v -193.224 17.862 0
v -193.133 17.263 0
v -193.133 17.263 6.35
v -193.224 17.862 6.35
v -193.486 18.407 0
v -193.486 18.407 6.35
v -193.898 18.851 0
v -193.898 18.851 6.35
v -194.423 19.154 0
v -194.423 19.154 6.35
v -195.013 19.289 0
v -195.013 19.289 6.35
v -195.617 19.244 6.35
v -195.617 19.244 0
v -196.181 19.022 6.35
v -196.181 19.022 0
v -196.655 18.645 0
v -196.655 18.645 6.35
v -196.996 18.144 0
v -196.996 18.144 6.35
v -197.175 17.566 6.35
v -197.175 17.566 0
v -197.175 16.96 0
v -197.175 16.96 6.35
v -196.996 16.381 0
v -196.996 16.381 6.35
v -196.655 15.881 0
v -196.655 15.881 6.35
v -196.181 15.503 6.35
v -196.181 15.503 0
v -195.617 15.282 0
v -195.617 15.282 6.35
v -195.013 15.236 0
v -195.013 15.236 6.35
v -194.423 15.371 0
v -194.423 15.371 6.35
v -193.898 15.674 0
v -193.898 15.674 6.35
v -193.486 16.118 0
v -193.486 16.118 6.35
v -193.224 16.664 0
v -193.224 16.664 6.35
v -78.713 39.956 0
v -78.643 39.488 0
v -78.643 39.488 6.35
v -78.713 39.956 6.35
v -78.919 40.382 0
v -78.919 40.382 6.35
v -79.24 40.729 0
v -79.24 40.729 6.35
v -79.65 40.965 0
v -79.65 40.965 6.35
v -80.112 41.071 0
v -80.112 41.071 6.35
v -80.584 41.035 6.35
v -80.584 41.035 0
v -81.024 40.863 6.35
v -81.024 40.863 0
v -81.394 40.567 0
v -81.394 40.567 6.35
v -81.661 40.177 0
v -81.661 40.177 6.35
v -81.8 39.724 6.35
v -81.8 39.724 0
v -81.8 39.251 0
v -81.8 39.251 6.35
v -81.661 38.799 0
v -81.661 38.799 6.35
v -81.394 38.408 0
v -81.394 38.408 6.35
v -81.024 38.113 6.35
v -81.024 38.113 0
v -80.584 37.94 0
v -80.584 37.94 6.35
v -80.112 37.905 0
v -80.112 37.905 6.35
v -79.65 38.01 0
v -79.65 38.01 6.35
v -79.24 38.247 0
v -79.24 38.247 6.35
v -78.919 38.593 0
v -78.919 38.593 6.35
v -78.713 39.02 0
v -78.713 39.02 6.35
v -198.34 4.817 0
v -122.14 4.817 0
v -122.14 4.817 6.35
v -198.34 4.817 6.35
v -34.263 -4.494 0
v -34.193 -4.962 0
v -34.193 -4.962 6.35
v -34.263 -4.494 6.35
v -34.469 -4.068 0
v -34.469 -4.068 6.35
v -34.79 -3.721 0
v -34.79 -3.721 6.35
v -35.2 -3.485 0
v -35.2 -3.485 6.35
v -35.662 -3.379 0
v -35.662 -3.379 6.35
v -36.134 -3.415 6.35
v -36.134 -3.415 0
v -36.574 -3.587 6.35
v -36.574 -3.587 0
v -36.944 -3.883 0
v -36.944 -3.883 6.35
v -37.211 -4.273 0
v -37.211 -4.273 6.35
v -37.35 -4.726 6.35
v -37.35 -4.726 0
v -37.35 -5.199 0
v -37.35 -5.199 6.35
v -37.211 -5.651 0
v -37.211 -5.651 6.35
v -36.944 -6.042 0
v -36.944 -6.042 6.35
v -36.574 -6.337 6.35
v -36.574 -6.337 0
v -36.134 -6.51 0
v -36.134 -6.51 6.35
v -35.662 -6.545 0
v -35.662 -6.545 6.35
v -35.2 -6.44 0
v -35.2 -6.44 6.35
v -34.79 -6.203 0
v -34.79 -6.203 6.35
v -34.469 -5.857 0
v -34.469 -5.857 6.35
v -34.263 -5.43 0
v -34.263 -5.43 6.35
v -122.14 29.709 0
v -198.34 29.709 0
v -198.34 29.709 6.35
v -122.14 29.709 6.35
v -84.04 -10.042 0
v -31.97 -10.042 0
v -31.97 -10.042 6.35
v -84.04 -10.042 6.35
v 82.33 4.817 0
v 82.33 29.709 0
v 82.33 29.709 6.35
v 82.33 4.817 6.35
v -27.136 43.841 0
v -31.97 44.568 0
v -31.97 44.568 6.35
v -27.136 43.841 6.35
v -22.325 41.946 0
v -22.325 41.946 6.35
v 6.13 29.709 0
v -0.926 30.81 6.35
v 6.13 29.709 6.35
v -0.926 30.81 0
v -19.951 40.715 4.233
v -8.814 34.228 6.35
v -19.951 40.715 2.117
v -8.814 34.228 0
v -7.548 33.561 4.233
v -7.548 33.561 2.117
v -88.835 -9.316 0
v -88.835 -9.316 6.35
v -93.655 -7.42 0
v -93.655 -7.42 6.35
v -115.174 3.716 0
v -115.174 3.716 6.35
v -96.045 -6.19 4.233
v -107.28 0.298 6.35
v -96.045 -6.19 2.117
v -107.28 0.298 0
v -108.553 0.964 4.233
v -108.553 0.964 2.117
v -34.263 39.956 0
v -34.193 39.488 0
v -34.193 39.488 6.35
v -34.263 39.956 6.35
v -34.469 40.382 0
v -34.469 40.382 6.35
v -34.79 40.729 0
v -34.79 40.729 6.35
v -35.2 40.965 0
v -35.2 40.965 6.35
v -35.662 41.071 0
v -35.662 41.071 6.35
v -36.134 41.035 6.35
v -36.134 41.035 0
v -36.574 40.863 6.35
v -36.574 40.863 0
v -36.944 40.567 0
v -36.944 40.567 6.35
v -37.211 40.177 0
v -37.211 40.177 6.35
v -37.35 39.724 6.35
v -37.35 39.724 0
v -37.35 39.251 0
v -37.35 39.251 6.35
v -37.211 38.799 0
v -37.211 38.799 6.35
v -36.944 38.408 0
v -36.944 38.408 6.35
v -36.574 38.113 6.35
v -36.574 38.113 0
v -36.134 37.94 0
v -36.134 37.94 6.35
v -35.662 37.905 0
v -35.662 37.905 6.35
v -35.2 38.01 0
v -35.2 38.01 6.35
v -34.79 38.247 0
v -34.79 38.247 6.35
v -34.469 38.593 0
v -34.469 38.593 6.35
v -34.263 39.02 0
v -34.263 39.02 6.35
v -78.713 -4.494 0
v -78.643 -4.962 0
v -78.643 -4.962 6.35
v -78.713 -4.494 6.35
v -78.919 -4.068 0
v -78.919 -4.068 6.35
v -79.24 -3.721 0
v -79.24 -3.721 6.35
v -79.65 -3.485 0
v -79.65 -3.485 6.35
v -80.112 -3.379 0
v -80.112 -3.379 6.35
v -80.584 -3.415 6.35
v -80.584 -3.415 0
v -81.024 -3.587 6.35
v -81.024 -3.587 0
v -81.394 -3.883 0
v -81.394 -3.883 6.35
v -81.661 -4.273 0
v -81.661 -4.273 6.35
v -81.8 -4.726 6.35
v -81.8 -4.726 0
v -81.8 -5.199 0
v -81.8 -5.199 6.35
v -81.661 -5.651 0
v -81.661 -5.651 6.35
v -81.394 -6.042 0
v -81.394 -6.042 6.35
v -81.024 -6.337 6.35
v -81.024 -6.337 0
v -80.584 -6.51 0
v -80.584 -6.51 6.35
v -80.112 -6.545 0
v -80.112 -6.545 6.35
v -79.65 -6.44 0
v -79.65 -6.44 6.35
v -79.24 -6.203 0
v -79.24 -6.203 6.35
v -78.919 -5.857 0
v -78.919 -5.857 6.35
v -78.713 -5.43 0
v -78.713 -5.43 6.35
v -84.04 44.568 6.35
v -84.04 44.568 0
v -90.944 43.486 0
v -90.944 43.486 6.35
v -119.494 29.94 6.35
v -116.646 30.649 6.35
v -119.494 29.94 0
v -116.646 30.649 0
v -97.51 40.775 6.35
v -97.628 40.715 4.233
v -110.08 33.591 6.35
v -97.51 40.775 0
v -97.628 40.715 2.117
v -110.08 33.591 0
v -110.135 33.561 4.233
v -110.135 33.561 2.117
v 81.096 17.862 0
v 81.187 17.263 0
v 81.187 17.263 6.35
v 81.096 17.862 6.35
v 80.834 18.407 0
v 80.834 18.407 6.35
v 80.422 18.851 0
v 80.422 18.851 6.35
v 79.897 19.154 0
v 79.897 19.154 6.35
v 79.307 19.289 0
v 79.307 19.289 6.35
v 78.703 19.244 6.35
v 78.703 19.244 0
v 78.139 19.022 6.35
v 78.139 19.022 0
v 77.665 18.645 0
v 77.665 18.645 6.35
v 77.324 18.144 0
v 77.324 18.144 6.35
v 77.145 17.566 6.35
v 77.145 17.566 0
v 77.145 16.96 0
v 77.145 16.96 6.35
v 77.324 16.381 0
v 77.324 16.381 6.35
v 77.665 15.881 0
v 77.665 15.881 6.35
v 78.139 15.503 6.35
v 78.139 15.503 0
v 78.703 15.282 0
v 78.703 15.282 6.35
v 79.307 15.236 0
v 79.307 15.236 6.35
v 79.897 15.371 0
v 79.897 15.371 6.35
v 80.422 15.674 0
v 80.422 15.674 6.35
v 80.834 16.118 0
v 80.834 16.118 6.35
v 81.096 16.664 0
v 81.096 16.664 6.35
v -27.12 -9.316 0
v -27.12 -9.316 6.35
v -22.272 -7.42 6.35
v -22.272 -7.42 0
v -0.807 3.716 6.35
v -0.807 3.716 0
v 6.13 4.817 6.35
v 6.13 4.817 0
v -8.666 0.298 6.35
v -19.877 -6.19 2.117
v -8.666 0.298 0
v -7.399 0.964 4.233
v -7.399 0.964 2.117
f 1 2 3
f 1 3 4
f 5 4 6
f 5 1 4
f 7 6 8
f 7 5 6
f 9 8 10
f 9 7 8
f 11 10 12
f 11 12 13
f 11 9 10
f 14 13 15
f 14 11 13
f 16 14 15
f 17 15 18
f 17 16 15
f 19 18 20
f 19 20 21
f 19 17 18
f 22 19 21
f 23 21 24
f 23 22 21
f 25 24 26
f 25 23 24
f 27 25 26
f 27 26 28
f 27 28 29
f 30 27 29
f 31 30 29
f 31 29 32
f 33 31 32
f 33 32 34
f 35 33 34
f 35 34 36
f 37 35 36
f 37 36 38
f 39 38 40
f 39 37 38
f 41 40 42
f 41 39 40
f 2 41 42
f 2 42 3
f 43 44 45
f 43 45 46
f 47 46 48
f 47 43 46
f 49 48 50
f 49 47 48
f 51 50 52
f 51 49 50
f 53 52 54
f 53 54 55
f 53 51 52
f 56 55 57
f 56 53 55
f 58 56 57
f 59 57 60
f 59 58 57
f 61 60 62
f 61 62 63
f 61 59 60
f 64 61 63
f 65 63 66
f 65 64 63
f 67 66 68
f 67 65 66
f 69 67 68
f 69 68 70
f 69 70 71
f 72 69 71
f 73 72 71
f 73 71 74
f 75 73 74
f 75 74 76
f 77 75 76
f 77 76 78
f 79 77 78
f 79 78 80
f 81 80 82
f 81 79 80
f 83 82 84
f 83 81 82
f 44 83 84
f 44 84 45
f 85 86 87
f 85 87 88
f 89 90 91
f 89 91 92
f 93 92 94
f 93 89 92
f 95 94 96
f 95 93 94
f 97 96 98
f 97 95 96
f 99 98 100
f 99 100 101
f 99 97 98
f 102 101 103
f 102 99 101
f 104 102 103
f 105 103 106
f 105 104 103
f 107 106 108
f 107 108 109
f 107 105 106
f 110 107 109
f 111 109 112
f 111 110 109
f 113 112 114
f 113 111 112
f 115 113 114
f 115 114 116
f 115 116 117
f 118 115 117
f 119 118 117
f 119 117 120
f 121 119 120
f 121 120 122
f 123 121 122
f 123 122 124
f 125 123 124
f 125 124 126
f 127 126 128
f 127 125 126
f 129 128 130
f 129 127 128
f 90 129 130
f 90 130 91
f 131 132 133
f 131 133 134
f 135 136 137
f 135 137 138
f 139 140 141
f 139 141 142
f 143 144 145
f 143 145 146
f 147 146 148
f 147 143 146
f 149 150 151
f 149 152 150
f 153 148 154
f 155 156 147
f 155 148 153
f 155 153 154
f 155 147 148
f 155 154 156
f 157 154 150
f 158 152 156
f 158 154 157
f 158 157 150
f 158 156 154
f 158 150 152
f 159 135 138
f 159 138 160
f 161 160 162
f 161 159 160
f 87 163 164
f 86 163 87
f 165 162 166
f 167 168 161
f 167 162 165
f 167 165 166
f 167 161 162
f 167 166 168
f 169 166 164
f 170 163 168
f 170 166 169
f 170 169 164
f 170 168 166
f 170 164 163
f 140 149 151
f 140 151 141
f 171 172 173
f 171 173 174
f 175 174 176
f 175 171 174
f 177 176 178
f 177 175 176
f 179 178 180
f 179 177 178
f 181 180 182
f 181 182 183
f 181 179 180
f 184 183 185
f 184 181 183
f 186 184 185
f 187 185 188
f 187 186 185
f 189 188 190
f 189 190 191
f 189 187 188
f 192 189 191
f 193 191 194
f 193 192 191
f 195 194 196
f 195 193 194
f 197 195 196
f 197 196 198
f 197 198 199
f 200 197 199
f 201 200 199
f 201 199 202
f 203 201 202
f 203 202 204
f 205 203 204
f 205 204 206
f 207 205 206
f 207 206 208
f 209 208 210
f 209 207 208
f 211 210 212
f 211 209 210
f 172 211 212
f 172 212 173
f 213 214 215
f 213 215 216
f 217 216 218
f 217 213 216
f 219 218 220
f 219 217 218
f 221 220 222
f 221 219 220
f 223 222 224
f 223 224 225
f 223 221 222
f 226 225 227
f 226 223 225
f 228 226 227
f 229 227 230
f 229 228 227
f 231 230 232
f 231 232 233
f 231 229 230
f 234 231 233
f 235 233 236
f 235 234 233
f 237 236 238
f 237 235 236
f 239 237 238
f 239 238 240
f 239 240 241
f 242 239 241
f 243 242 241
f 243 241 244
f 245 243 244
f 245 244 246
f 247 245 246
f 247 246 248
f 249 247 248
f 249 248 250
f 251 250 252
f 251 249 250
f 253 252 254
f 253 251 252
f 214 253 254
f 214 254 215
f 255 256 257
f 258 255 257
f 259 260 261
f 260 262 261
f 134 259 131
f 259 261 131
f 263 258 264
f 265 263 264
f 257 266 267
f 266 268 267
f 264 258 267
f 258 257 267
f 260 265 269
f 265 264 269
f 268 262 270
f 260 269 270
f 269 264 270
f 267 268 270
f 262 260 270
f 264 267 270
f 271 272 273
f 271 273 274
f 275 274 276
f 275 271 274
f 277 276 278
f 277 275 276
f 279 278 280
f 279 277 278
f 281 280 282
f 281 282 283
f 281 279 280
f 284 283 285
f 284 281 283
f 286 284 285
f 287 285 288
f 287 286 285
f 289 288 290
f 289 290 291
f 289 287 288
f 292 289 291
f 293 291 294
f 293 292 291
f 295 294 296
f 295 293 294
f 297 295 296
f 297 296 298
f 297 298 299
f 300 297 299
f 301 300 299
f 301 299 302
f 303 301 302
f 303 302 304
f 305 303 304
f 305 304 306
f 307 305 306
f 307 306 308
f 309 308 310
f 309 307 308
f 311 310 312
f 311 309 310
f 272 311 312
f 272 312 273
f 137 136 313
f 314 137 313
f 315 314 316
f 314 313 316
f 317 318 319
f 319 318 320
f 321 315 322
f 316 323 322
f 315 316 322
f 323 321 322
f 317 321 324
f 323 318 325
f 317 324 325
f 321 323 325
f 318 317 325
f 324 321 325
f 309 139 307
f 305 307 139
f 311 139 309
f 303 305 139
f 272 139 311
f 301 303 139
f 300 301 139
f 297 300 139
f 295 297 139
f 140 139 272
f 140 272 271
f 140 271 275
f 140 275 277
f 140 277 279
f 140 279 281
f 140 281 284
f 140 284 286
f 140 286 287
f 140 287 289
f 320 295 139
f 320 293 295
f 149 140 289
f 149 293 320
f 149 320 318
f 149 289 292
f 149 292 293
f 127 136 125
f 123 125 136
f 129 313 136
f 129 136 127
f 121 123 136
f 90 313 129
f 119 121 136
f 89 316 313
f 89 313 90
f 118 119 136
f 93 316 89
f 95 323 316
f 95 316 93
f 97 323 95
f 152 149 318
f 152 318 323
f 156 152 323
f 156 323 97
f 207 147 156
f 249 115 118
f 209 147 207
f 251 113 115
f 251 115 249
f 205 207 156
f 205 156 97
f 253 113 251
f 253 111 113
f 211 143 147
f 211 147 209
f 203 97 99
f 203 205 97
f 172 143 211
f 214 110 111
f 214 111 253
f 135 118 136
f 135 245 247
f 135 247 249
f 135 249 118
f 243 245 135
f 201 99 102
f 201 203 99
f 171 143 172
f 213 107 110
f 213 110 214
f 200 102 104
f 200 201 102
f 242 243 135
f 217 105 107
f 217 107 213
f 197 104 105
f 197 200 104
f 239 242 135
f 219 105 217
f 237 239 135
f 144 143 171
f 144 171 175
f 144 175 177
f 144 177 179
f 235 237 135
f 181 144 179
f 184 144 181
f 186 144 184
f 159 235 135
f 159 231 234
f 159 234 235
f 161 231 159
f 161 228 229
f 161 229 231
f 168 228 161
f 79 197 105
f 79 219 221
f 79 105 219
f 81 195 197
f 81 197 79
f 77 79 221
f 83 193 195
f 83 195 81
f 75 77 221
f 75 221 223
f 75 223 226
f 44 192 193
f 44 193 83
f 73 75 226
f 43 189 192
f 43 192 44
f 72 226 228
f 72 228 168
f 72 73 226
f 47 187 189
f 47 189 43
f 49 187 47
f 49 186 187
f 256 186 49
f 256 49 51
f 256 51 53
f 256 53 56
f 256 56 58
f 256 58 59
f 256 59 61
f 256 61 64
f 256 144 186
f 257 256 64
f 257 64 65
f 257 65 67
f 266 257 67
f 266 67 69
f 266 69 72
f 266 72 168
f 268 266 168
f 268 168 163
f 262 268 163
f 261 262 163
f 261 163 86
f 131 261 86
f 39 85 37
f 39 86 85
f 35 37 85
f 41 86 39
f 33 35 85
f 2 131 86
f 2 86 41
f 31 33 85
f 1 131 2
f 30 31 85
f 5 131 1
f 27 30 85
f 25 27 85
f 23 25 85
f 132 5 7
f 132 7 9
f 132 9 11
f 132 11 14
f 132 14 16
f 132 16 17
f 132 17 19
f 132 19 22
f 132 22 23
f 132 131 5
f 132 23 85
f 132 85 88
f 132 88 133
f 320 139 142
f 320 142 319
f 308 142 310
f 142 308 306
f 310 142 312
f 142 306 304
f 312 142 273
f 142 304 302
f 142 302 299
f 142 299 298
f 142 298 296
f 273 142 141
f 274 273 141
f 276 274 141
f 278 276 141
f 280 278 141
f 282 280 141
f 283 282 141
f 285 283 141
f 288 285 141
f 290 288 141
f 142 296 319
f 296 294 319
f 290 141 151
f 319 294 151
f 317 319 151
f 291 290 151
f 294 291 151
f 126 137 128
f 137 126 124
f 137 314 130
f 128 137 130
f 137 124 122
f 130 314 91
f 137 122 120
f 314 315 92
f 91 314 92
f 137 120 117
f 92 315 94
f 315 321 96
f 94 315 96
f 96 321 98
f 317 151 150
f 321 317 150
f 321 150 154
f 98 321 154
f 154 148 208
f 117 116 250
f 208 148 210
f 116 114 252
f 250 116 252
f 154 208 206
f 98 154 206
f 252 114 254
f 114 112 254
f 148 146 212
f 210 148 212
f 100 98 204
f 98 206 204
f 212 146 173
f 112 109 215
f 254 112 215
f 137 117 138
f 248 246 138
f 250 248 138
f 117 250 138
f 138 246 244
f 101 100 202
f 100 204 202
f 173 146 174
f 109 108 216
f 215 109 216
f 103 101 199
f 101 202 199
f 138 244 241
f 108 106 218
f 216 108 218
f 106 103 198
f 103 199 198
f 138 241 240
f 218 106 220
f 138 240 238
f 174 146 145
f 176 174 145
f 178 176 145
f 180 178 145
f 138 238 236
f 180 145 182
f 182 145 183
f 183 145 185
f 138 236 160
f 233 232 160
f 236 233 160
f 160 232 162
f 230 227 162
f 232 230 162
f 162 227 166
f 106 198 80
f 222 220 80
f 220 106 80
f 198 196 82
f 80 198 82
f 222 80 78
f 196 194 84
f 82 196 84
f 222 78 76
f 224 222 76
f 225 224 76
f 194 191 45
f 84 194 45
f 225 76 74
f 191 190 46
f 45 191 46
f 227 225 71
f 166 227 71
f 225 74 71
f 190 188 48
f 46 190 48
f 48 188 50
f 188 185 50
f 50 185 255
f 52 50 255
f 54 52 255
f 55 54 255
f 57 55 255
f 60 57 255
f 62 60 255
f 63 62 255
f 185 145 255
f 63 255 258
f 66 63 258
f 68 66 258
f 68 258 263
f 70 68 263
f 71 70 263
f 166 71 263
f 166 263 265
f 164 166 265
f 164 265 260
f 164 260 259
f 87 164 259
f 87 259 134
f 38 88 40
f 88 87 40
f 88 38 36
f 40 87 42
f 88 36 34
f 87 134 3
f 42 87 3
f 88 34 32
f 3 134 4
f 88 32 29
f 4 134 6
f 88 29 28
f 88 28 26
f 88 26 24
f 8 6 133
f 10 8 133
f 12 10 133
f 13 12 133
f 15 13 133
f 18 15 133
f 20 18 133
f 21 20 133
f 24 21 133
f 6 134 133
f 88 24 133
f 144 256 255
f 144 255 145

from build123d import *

# Parameters (mm, degrees)
SKETCH1_R      = 1.5875
SKETCH1_R_2    = 2.032
EXTRUDE1_DEPTH = 6.35


with BuildPart() as part:
    # Sketch1 → Extrude1 (new body)
    with BuildSketch(Plane.XY):
        with BuildLine():
            Line((-198.340264606, 29.708721685), (-122.140264606, 29.708721685))
            add(Edge.make_bspline(
                [(-84.040264606, 44.567721685), (-98.359806002, 44.567721685), (-110.19434592, 29.708721685), (-122.140264606, 29.708721685)],
                knots=[0, 0, 0, 0, 1, 1, 1, 1], degree=3))
            Line((-84.040264606, 44.567721685), (-31.970264606, 44.567721685))
            add(Edge.make_bspline(
                [(-31.970264606, 44.567721685), (-19.845994983, 44.567721685), (-8.482470496, 29.708721685), (6.129735394, 29.708721685)],
                knots=[0, 0, 0, 0, 1, 1, 1, 1], degree=3))
            Line((6.129735394, 29.708721685), (82.329735394, 29.708721685))
            Line((82.329735394, 29.708721685), (82.329735394, 4.816721685))
            Line((82.329735394, 4.816721685), (6.129735394, 4.816721685))
            add(Edge.make_bspline(
                [(-31.970264606, -10.042278315), (-19.845994974, -10.042278315), (-8.148130117, 4.816721685), (6.129735394, 4.816721685)],
                knots=[0, 0, 0, 0, 1, 1, 1, 1], degree=3))
            Line((-31.970264606, -10.042278315), (-84.040264606, -10.042278315))
            add(Edge.make_bspline(
                [(-84.040264606, -10.042278315), (-95.986183291, -10.042278315), (-107.820723209, 4.816721685), (-122.140264606, 4.816721685)],
                knots=[0, 0, 0, 0, 1, 1, 1, 1], degree=3))
            Line((-122.140264606, 4.816721685), (-198.340264606, 4.816721685))
            Line((-198.340264606, 4.816721685), (-198.340264606, 29.708721685))
        make_face()
        with Locations((-80.230264606, 39.487721685)):
            Circle(SKETCH1_R, mode=Mode.SUBTRACT)
        with Locations((-35.780264606, 39.487721685)):
            Circle(SKETCH1_R, mode=Mode.SUBTRACT)
        with Locations((-80.230264606, -4.962278315)):
            Circle(SKETCH1_R, mode=Mode.SUBTRACT)
        with Locations((-35.780264606, -4.962278315)):
            Circle(SKETCH1_R, mode=Mode.SUBTRACT)
        with Locations((79.154735394, 17.262721685)):
            Circle(SKETCH1_R_2, mode=Mode.SUBTRACT)
        with Locations((-195.165264606, 17.262721685)):
            Circle(SKETCH1_R_2, mode=Mode.SUBTRACT)
    extrude(amount=EXTRUDE1_DEPTH)


solid = part.part
